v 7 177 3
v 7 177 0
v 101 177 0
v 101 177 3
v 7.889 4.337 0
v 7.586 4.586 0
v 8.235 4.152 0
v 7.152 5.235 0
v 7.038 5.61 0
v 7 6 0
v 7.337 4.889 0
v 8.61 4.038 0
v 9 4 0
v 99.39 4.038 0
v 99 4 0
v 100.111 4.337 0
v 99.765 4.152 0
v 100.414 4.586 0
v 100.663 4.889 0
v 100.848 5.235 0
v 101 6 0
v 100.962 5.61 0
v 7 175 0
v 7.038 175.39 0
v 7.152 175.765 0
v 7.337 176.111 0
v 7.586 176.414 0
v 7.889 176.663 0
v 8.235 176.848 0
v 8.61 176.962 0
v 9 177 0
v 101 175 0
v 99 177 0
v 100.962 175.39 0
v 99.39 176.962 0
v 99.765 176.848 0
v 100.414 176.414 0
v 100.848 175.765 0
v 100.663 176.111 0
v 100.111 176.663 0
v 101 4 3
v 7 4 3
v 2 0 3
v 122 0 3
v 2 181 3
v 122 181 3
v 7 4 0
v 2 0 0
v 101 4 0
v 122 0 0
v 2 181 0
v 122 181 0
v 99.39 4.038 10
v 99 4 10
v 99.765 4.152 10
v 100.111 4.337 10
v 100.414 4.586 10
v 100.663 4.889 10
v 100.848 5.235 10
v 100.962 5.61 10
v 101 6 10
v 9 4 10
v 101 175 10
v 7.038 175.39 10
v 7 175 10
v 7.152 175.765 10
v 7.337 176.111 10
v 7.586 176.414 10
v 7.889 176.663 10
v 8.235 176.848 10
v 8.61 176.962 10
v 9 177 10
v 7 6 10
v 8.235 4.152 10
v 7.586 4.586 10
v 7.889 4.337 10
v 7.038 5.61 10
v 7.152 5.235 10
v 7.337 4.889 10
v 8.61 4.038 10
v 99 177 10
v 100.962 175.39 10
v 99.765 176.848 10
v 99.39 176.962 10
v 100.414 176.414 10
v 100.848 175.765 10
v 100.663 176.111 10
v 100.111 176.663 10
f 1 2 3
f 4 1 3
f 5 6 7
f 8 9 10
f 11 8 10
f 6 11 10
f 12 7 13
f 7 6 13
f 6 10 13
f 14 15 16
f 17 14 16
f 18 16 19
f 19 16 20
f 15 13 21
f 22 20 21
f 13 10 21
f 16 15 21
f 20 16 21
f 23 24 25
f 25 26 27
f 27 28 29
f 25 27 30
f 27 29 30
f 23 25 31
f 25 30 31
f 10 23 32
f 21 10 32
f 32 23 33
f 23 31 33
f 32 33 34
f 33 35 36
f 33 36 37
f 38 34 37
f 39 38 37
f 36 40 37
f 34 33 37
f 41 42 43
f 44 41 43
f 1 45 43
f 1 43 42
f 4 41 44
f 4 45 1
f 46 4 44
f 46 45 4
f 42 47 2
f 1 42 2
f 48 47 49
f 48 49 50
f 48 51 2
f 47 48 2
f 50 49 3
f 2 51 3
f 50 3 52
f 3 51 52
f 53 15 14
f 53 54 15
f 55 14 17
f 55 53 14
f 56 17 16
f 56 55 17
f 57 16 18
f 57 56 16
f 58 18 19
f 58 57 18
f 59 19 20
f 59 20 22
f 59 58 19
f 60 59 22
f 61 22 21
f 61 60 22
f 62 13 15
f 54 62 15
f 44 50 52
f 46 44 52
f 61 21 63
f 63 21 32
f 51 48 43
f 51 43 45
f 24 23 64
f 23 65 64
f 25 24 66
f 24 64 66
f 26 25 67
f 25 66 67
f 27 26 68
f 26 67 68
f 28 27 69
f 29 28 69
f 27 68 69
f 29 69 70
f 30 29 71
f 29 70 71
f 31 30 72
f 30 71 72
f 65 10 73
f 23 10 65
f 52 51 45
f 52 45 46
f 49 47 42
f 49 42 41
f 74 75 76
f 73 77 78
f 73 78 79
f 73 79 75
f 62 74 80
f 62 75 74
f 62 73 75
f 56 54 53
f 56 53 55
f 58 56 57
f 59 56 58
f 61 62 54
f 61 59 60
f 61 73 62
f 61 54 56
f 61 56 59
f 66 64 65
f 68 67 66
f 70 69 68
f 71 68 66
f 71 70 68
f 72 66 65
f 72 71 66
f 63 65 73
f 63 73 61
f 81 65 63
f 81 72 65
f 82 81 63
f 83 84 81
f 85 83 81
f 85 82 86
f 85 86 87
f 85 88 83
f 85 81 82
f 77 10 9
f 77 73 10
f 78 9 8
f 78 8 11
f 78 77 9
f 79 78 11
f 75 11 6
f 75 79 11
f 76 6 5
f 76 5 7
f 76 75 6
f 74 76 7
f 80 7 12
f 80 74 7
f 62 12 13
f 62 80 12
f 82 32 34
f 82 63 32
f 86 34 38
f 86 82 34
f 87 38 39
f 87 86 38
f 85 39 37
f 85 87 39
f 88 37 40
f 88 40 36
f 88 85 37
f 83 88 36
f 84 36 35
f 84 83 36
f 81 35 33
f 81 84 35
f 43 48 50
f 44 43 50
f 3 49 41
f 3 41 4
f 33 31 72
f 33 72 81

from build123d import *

# Parameters (mm, degrees)
BOX001_W     = 94
BOX001_H     = 173
BOX001_DEPTH = 10
BOX_W        = 120
BOX_H        = 181
BOX_DEPTH    = 3
FILLET_R     = 2


with BuildPart() as cube001:
    # Box001 → Box001 (new body)
    with BuildSketch(Plane(origin=(7, 4, 0), x_dir=(1, 0, 0), z_dir=(0, 0, 1))):
        with Locations((47, 86.5)):
            Rectangle(BOX001_W, BOX001_H)
    extrude(amount=BOX001_DEPTH)


with BuildPart() as cut:
    # Box → Box (new body)
    with BuildSketch(Plane(origin=(2, 0, 0), x_dir=(1, 0, 0), z_dir=(0, 0, 1))):
        with Locations((60, 90.5)):
            Rectangle(BOX_W, BOX_H)
    extrude(amount=BOX_DEPTH)

    # Cut: cut Cube001
    add(cube001.part, mode=Mode.SUBTRACT)


with BuildPart() as fillet_body:
    # Fillet base: copy of Cube001
    add(cube001.part)

    # Fillet
    fillet_edges = [fillet_body.edges().sort_by_distance(p)[0] for p in [
        (7, 4, 5),
        (7, 177, 5),
        (101, 4, 5),
        (101, 177, 5),
    ]]
    fillet(fillet_edges, radius=FILLET_R)


solid = Compound([cut.part, fillet_body.part])
